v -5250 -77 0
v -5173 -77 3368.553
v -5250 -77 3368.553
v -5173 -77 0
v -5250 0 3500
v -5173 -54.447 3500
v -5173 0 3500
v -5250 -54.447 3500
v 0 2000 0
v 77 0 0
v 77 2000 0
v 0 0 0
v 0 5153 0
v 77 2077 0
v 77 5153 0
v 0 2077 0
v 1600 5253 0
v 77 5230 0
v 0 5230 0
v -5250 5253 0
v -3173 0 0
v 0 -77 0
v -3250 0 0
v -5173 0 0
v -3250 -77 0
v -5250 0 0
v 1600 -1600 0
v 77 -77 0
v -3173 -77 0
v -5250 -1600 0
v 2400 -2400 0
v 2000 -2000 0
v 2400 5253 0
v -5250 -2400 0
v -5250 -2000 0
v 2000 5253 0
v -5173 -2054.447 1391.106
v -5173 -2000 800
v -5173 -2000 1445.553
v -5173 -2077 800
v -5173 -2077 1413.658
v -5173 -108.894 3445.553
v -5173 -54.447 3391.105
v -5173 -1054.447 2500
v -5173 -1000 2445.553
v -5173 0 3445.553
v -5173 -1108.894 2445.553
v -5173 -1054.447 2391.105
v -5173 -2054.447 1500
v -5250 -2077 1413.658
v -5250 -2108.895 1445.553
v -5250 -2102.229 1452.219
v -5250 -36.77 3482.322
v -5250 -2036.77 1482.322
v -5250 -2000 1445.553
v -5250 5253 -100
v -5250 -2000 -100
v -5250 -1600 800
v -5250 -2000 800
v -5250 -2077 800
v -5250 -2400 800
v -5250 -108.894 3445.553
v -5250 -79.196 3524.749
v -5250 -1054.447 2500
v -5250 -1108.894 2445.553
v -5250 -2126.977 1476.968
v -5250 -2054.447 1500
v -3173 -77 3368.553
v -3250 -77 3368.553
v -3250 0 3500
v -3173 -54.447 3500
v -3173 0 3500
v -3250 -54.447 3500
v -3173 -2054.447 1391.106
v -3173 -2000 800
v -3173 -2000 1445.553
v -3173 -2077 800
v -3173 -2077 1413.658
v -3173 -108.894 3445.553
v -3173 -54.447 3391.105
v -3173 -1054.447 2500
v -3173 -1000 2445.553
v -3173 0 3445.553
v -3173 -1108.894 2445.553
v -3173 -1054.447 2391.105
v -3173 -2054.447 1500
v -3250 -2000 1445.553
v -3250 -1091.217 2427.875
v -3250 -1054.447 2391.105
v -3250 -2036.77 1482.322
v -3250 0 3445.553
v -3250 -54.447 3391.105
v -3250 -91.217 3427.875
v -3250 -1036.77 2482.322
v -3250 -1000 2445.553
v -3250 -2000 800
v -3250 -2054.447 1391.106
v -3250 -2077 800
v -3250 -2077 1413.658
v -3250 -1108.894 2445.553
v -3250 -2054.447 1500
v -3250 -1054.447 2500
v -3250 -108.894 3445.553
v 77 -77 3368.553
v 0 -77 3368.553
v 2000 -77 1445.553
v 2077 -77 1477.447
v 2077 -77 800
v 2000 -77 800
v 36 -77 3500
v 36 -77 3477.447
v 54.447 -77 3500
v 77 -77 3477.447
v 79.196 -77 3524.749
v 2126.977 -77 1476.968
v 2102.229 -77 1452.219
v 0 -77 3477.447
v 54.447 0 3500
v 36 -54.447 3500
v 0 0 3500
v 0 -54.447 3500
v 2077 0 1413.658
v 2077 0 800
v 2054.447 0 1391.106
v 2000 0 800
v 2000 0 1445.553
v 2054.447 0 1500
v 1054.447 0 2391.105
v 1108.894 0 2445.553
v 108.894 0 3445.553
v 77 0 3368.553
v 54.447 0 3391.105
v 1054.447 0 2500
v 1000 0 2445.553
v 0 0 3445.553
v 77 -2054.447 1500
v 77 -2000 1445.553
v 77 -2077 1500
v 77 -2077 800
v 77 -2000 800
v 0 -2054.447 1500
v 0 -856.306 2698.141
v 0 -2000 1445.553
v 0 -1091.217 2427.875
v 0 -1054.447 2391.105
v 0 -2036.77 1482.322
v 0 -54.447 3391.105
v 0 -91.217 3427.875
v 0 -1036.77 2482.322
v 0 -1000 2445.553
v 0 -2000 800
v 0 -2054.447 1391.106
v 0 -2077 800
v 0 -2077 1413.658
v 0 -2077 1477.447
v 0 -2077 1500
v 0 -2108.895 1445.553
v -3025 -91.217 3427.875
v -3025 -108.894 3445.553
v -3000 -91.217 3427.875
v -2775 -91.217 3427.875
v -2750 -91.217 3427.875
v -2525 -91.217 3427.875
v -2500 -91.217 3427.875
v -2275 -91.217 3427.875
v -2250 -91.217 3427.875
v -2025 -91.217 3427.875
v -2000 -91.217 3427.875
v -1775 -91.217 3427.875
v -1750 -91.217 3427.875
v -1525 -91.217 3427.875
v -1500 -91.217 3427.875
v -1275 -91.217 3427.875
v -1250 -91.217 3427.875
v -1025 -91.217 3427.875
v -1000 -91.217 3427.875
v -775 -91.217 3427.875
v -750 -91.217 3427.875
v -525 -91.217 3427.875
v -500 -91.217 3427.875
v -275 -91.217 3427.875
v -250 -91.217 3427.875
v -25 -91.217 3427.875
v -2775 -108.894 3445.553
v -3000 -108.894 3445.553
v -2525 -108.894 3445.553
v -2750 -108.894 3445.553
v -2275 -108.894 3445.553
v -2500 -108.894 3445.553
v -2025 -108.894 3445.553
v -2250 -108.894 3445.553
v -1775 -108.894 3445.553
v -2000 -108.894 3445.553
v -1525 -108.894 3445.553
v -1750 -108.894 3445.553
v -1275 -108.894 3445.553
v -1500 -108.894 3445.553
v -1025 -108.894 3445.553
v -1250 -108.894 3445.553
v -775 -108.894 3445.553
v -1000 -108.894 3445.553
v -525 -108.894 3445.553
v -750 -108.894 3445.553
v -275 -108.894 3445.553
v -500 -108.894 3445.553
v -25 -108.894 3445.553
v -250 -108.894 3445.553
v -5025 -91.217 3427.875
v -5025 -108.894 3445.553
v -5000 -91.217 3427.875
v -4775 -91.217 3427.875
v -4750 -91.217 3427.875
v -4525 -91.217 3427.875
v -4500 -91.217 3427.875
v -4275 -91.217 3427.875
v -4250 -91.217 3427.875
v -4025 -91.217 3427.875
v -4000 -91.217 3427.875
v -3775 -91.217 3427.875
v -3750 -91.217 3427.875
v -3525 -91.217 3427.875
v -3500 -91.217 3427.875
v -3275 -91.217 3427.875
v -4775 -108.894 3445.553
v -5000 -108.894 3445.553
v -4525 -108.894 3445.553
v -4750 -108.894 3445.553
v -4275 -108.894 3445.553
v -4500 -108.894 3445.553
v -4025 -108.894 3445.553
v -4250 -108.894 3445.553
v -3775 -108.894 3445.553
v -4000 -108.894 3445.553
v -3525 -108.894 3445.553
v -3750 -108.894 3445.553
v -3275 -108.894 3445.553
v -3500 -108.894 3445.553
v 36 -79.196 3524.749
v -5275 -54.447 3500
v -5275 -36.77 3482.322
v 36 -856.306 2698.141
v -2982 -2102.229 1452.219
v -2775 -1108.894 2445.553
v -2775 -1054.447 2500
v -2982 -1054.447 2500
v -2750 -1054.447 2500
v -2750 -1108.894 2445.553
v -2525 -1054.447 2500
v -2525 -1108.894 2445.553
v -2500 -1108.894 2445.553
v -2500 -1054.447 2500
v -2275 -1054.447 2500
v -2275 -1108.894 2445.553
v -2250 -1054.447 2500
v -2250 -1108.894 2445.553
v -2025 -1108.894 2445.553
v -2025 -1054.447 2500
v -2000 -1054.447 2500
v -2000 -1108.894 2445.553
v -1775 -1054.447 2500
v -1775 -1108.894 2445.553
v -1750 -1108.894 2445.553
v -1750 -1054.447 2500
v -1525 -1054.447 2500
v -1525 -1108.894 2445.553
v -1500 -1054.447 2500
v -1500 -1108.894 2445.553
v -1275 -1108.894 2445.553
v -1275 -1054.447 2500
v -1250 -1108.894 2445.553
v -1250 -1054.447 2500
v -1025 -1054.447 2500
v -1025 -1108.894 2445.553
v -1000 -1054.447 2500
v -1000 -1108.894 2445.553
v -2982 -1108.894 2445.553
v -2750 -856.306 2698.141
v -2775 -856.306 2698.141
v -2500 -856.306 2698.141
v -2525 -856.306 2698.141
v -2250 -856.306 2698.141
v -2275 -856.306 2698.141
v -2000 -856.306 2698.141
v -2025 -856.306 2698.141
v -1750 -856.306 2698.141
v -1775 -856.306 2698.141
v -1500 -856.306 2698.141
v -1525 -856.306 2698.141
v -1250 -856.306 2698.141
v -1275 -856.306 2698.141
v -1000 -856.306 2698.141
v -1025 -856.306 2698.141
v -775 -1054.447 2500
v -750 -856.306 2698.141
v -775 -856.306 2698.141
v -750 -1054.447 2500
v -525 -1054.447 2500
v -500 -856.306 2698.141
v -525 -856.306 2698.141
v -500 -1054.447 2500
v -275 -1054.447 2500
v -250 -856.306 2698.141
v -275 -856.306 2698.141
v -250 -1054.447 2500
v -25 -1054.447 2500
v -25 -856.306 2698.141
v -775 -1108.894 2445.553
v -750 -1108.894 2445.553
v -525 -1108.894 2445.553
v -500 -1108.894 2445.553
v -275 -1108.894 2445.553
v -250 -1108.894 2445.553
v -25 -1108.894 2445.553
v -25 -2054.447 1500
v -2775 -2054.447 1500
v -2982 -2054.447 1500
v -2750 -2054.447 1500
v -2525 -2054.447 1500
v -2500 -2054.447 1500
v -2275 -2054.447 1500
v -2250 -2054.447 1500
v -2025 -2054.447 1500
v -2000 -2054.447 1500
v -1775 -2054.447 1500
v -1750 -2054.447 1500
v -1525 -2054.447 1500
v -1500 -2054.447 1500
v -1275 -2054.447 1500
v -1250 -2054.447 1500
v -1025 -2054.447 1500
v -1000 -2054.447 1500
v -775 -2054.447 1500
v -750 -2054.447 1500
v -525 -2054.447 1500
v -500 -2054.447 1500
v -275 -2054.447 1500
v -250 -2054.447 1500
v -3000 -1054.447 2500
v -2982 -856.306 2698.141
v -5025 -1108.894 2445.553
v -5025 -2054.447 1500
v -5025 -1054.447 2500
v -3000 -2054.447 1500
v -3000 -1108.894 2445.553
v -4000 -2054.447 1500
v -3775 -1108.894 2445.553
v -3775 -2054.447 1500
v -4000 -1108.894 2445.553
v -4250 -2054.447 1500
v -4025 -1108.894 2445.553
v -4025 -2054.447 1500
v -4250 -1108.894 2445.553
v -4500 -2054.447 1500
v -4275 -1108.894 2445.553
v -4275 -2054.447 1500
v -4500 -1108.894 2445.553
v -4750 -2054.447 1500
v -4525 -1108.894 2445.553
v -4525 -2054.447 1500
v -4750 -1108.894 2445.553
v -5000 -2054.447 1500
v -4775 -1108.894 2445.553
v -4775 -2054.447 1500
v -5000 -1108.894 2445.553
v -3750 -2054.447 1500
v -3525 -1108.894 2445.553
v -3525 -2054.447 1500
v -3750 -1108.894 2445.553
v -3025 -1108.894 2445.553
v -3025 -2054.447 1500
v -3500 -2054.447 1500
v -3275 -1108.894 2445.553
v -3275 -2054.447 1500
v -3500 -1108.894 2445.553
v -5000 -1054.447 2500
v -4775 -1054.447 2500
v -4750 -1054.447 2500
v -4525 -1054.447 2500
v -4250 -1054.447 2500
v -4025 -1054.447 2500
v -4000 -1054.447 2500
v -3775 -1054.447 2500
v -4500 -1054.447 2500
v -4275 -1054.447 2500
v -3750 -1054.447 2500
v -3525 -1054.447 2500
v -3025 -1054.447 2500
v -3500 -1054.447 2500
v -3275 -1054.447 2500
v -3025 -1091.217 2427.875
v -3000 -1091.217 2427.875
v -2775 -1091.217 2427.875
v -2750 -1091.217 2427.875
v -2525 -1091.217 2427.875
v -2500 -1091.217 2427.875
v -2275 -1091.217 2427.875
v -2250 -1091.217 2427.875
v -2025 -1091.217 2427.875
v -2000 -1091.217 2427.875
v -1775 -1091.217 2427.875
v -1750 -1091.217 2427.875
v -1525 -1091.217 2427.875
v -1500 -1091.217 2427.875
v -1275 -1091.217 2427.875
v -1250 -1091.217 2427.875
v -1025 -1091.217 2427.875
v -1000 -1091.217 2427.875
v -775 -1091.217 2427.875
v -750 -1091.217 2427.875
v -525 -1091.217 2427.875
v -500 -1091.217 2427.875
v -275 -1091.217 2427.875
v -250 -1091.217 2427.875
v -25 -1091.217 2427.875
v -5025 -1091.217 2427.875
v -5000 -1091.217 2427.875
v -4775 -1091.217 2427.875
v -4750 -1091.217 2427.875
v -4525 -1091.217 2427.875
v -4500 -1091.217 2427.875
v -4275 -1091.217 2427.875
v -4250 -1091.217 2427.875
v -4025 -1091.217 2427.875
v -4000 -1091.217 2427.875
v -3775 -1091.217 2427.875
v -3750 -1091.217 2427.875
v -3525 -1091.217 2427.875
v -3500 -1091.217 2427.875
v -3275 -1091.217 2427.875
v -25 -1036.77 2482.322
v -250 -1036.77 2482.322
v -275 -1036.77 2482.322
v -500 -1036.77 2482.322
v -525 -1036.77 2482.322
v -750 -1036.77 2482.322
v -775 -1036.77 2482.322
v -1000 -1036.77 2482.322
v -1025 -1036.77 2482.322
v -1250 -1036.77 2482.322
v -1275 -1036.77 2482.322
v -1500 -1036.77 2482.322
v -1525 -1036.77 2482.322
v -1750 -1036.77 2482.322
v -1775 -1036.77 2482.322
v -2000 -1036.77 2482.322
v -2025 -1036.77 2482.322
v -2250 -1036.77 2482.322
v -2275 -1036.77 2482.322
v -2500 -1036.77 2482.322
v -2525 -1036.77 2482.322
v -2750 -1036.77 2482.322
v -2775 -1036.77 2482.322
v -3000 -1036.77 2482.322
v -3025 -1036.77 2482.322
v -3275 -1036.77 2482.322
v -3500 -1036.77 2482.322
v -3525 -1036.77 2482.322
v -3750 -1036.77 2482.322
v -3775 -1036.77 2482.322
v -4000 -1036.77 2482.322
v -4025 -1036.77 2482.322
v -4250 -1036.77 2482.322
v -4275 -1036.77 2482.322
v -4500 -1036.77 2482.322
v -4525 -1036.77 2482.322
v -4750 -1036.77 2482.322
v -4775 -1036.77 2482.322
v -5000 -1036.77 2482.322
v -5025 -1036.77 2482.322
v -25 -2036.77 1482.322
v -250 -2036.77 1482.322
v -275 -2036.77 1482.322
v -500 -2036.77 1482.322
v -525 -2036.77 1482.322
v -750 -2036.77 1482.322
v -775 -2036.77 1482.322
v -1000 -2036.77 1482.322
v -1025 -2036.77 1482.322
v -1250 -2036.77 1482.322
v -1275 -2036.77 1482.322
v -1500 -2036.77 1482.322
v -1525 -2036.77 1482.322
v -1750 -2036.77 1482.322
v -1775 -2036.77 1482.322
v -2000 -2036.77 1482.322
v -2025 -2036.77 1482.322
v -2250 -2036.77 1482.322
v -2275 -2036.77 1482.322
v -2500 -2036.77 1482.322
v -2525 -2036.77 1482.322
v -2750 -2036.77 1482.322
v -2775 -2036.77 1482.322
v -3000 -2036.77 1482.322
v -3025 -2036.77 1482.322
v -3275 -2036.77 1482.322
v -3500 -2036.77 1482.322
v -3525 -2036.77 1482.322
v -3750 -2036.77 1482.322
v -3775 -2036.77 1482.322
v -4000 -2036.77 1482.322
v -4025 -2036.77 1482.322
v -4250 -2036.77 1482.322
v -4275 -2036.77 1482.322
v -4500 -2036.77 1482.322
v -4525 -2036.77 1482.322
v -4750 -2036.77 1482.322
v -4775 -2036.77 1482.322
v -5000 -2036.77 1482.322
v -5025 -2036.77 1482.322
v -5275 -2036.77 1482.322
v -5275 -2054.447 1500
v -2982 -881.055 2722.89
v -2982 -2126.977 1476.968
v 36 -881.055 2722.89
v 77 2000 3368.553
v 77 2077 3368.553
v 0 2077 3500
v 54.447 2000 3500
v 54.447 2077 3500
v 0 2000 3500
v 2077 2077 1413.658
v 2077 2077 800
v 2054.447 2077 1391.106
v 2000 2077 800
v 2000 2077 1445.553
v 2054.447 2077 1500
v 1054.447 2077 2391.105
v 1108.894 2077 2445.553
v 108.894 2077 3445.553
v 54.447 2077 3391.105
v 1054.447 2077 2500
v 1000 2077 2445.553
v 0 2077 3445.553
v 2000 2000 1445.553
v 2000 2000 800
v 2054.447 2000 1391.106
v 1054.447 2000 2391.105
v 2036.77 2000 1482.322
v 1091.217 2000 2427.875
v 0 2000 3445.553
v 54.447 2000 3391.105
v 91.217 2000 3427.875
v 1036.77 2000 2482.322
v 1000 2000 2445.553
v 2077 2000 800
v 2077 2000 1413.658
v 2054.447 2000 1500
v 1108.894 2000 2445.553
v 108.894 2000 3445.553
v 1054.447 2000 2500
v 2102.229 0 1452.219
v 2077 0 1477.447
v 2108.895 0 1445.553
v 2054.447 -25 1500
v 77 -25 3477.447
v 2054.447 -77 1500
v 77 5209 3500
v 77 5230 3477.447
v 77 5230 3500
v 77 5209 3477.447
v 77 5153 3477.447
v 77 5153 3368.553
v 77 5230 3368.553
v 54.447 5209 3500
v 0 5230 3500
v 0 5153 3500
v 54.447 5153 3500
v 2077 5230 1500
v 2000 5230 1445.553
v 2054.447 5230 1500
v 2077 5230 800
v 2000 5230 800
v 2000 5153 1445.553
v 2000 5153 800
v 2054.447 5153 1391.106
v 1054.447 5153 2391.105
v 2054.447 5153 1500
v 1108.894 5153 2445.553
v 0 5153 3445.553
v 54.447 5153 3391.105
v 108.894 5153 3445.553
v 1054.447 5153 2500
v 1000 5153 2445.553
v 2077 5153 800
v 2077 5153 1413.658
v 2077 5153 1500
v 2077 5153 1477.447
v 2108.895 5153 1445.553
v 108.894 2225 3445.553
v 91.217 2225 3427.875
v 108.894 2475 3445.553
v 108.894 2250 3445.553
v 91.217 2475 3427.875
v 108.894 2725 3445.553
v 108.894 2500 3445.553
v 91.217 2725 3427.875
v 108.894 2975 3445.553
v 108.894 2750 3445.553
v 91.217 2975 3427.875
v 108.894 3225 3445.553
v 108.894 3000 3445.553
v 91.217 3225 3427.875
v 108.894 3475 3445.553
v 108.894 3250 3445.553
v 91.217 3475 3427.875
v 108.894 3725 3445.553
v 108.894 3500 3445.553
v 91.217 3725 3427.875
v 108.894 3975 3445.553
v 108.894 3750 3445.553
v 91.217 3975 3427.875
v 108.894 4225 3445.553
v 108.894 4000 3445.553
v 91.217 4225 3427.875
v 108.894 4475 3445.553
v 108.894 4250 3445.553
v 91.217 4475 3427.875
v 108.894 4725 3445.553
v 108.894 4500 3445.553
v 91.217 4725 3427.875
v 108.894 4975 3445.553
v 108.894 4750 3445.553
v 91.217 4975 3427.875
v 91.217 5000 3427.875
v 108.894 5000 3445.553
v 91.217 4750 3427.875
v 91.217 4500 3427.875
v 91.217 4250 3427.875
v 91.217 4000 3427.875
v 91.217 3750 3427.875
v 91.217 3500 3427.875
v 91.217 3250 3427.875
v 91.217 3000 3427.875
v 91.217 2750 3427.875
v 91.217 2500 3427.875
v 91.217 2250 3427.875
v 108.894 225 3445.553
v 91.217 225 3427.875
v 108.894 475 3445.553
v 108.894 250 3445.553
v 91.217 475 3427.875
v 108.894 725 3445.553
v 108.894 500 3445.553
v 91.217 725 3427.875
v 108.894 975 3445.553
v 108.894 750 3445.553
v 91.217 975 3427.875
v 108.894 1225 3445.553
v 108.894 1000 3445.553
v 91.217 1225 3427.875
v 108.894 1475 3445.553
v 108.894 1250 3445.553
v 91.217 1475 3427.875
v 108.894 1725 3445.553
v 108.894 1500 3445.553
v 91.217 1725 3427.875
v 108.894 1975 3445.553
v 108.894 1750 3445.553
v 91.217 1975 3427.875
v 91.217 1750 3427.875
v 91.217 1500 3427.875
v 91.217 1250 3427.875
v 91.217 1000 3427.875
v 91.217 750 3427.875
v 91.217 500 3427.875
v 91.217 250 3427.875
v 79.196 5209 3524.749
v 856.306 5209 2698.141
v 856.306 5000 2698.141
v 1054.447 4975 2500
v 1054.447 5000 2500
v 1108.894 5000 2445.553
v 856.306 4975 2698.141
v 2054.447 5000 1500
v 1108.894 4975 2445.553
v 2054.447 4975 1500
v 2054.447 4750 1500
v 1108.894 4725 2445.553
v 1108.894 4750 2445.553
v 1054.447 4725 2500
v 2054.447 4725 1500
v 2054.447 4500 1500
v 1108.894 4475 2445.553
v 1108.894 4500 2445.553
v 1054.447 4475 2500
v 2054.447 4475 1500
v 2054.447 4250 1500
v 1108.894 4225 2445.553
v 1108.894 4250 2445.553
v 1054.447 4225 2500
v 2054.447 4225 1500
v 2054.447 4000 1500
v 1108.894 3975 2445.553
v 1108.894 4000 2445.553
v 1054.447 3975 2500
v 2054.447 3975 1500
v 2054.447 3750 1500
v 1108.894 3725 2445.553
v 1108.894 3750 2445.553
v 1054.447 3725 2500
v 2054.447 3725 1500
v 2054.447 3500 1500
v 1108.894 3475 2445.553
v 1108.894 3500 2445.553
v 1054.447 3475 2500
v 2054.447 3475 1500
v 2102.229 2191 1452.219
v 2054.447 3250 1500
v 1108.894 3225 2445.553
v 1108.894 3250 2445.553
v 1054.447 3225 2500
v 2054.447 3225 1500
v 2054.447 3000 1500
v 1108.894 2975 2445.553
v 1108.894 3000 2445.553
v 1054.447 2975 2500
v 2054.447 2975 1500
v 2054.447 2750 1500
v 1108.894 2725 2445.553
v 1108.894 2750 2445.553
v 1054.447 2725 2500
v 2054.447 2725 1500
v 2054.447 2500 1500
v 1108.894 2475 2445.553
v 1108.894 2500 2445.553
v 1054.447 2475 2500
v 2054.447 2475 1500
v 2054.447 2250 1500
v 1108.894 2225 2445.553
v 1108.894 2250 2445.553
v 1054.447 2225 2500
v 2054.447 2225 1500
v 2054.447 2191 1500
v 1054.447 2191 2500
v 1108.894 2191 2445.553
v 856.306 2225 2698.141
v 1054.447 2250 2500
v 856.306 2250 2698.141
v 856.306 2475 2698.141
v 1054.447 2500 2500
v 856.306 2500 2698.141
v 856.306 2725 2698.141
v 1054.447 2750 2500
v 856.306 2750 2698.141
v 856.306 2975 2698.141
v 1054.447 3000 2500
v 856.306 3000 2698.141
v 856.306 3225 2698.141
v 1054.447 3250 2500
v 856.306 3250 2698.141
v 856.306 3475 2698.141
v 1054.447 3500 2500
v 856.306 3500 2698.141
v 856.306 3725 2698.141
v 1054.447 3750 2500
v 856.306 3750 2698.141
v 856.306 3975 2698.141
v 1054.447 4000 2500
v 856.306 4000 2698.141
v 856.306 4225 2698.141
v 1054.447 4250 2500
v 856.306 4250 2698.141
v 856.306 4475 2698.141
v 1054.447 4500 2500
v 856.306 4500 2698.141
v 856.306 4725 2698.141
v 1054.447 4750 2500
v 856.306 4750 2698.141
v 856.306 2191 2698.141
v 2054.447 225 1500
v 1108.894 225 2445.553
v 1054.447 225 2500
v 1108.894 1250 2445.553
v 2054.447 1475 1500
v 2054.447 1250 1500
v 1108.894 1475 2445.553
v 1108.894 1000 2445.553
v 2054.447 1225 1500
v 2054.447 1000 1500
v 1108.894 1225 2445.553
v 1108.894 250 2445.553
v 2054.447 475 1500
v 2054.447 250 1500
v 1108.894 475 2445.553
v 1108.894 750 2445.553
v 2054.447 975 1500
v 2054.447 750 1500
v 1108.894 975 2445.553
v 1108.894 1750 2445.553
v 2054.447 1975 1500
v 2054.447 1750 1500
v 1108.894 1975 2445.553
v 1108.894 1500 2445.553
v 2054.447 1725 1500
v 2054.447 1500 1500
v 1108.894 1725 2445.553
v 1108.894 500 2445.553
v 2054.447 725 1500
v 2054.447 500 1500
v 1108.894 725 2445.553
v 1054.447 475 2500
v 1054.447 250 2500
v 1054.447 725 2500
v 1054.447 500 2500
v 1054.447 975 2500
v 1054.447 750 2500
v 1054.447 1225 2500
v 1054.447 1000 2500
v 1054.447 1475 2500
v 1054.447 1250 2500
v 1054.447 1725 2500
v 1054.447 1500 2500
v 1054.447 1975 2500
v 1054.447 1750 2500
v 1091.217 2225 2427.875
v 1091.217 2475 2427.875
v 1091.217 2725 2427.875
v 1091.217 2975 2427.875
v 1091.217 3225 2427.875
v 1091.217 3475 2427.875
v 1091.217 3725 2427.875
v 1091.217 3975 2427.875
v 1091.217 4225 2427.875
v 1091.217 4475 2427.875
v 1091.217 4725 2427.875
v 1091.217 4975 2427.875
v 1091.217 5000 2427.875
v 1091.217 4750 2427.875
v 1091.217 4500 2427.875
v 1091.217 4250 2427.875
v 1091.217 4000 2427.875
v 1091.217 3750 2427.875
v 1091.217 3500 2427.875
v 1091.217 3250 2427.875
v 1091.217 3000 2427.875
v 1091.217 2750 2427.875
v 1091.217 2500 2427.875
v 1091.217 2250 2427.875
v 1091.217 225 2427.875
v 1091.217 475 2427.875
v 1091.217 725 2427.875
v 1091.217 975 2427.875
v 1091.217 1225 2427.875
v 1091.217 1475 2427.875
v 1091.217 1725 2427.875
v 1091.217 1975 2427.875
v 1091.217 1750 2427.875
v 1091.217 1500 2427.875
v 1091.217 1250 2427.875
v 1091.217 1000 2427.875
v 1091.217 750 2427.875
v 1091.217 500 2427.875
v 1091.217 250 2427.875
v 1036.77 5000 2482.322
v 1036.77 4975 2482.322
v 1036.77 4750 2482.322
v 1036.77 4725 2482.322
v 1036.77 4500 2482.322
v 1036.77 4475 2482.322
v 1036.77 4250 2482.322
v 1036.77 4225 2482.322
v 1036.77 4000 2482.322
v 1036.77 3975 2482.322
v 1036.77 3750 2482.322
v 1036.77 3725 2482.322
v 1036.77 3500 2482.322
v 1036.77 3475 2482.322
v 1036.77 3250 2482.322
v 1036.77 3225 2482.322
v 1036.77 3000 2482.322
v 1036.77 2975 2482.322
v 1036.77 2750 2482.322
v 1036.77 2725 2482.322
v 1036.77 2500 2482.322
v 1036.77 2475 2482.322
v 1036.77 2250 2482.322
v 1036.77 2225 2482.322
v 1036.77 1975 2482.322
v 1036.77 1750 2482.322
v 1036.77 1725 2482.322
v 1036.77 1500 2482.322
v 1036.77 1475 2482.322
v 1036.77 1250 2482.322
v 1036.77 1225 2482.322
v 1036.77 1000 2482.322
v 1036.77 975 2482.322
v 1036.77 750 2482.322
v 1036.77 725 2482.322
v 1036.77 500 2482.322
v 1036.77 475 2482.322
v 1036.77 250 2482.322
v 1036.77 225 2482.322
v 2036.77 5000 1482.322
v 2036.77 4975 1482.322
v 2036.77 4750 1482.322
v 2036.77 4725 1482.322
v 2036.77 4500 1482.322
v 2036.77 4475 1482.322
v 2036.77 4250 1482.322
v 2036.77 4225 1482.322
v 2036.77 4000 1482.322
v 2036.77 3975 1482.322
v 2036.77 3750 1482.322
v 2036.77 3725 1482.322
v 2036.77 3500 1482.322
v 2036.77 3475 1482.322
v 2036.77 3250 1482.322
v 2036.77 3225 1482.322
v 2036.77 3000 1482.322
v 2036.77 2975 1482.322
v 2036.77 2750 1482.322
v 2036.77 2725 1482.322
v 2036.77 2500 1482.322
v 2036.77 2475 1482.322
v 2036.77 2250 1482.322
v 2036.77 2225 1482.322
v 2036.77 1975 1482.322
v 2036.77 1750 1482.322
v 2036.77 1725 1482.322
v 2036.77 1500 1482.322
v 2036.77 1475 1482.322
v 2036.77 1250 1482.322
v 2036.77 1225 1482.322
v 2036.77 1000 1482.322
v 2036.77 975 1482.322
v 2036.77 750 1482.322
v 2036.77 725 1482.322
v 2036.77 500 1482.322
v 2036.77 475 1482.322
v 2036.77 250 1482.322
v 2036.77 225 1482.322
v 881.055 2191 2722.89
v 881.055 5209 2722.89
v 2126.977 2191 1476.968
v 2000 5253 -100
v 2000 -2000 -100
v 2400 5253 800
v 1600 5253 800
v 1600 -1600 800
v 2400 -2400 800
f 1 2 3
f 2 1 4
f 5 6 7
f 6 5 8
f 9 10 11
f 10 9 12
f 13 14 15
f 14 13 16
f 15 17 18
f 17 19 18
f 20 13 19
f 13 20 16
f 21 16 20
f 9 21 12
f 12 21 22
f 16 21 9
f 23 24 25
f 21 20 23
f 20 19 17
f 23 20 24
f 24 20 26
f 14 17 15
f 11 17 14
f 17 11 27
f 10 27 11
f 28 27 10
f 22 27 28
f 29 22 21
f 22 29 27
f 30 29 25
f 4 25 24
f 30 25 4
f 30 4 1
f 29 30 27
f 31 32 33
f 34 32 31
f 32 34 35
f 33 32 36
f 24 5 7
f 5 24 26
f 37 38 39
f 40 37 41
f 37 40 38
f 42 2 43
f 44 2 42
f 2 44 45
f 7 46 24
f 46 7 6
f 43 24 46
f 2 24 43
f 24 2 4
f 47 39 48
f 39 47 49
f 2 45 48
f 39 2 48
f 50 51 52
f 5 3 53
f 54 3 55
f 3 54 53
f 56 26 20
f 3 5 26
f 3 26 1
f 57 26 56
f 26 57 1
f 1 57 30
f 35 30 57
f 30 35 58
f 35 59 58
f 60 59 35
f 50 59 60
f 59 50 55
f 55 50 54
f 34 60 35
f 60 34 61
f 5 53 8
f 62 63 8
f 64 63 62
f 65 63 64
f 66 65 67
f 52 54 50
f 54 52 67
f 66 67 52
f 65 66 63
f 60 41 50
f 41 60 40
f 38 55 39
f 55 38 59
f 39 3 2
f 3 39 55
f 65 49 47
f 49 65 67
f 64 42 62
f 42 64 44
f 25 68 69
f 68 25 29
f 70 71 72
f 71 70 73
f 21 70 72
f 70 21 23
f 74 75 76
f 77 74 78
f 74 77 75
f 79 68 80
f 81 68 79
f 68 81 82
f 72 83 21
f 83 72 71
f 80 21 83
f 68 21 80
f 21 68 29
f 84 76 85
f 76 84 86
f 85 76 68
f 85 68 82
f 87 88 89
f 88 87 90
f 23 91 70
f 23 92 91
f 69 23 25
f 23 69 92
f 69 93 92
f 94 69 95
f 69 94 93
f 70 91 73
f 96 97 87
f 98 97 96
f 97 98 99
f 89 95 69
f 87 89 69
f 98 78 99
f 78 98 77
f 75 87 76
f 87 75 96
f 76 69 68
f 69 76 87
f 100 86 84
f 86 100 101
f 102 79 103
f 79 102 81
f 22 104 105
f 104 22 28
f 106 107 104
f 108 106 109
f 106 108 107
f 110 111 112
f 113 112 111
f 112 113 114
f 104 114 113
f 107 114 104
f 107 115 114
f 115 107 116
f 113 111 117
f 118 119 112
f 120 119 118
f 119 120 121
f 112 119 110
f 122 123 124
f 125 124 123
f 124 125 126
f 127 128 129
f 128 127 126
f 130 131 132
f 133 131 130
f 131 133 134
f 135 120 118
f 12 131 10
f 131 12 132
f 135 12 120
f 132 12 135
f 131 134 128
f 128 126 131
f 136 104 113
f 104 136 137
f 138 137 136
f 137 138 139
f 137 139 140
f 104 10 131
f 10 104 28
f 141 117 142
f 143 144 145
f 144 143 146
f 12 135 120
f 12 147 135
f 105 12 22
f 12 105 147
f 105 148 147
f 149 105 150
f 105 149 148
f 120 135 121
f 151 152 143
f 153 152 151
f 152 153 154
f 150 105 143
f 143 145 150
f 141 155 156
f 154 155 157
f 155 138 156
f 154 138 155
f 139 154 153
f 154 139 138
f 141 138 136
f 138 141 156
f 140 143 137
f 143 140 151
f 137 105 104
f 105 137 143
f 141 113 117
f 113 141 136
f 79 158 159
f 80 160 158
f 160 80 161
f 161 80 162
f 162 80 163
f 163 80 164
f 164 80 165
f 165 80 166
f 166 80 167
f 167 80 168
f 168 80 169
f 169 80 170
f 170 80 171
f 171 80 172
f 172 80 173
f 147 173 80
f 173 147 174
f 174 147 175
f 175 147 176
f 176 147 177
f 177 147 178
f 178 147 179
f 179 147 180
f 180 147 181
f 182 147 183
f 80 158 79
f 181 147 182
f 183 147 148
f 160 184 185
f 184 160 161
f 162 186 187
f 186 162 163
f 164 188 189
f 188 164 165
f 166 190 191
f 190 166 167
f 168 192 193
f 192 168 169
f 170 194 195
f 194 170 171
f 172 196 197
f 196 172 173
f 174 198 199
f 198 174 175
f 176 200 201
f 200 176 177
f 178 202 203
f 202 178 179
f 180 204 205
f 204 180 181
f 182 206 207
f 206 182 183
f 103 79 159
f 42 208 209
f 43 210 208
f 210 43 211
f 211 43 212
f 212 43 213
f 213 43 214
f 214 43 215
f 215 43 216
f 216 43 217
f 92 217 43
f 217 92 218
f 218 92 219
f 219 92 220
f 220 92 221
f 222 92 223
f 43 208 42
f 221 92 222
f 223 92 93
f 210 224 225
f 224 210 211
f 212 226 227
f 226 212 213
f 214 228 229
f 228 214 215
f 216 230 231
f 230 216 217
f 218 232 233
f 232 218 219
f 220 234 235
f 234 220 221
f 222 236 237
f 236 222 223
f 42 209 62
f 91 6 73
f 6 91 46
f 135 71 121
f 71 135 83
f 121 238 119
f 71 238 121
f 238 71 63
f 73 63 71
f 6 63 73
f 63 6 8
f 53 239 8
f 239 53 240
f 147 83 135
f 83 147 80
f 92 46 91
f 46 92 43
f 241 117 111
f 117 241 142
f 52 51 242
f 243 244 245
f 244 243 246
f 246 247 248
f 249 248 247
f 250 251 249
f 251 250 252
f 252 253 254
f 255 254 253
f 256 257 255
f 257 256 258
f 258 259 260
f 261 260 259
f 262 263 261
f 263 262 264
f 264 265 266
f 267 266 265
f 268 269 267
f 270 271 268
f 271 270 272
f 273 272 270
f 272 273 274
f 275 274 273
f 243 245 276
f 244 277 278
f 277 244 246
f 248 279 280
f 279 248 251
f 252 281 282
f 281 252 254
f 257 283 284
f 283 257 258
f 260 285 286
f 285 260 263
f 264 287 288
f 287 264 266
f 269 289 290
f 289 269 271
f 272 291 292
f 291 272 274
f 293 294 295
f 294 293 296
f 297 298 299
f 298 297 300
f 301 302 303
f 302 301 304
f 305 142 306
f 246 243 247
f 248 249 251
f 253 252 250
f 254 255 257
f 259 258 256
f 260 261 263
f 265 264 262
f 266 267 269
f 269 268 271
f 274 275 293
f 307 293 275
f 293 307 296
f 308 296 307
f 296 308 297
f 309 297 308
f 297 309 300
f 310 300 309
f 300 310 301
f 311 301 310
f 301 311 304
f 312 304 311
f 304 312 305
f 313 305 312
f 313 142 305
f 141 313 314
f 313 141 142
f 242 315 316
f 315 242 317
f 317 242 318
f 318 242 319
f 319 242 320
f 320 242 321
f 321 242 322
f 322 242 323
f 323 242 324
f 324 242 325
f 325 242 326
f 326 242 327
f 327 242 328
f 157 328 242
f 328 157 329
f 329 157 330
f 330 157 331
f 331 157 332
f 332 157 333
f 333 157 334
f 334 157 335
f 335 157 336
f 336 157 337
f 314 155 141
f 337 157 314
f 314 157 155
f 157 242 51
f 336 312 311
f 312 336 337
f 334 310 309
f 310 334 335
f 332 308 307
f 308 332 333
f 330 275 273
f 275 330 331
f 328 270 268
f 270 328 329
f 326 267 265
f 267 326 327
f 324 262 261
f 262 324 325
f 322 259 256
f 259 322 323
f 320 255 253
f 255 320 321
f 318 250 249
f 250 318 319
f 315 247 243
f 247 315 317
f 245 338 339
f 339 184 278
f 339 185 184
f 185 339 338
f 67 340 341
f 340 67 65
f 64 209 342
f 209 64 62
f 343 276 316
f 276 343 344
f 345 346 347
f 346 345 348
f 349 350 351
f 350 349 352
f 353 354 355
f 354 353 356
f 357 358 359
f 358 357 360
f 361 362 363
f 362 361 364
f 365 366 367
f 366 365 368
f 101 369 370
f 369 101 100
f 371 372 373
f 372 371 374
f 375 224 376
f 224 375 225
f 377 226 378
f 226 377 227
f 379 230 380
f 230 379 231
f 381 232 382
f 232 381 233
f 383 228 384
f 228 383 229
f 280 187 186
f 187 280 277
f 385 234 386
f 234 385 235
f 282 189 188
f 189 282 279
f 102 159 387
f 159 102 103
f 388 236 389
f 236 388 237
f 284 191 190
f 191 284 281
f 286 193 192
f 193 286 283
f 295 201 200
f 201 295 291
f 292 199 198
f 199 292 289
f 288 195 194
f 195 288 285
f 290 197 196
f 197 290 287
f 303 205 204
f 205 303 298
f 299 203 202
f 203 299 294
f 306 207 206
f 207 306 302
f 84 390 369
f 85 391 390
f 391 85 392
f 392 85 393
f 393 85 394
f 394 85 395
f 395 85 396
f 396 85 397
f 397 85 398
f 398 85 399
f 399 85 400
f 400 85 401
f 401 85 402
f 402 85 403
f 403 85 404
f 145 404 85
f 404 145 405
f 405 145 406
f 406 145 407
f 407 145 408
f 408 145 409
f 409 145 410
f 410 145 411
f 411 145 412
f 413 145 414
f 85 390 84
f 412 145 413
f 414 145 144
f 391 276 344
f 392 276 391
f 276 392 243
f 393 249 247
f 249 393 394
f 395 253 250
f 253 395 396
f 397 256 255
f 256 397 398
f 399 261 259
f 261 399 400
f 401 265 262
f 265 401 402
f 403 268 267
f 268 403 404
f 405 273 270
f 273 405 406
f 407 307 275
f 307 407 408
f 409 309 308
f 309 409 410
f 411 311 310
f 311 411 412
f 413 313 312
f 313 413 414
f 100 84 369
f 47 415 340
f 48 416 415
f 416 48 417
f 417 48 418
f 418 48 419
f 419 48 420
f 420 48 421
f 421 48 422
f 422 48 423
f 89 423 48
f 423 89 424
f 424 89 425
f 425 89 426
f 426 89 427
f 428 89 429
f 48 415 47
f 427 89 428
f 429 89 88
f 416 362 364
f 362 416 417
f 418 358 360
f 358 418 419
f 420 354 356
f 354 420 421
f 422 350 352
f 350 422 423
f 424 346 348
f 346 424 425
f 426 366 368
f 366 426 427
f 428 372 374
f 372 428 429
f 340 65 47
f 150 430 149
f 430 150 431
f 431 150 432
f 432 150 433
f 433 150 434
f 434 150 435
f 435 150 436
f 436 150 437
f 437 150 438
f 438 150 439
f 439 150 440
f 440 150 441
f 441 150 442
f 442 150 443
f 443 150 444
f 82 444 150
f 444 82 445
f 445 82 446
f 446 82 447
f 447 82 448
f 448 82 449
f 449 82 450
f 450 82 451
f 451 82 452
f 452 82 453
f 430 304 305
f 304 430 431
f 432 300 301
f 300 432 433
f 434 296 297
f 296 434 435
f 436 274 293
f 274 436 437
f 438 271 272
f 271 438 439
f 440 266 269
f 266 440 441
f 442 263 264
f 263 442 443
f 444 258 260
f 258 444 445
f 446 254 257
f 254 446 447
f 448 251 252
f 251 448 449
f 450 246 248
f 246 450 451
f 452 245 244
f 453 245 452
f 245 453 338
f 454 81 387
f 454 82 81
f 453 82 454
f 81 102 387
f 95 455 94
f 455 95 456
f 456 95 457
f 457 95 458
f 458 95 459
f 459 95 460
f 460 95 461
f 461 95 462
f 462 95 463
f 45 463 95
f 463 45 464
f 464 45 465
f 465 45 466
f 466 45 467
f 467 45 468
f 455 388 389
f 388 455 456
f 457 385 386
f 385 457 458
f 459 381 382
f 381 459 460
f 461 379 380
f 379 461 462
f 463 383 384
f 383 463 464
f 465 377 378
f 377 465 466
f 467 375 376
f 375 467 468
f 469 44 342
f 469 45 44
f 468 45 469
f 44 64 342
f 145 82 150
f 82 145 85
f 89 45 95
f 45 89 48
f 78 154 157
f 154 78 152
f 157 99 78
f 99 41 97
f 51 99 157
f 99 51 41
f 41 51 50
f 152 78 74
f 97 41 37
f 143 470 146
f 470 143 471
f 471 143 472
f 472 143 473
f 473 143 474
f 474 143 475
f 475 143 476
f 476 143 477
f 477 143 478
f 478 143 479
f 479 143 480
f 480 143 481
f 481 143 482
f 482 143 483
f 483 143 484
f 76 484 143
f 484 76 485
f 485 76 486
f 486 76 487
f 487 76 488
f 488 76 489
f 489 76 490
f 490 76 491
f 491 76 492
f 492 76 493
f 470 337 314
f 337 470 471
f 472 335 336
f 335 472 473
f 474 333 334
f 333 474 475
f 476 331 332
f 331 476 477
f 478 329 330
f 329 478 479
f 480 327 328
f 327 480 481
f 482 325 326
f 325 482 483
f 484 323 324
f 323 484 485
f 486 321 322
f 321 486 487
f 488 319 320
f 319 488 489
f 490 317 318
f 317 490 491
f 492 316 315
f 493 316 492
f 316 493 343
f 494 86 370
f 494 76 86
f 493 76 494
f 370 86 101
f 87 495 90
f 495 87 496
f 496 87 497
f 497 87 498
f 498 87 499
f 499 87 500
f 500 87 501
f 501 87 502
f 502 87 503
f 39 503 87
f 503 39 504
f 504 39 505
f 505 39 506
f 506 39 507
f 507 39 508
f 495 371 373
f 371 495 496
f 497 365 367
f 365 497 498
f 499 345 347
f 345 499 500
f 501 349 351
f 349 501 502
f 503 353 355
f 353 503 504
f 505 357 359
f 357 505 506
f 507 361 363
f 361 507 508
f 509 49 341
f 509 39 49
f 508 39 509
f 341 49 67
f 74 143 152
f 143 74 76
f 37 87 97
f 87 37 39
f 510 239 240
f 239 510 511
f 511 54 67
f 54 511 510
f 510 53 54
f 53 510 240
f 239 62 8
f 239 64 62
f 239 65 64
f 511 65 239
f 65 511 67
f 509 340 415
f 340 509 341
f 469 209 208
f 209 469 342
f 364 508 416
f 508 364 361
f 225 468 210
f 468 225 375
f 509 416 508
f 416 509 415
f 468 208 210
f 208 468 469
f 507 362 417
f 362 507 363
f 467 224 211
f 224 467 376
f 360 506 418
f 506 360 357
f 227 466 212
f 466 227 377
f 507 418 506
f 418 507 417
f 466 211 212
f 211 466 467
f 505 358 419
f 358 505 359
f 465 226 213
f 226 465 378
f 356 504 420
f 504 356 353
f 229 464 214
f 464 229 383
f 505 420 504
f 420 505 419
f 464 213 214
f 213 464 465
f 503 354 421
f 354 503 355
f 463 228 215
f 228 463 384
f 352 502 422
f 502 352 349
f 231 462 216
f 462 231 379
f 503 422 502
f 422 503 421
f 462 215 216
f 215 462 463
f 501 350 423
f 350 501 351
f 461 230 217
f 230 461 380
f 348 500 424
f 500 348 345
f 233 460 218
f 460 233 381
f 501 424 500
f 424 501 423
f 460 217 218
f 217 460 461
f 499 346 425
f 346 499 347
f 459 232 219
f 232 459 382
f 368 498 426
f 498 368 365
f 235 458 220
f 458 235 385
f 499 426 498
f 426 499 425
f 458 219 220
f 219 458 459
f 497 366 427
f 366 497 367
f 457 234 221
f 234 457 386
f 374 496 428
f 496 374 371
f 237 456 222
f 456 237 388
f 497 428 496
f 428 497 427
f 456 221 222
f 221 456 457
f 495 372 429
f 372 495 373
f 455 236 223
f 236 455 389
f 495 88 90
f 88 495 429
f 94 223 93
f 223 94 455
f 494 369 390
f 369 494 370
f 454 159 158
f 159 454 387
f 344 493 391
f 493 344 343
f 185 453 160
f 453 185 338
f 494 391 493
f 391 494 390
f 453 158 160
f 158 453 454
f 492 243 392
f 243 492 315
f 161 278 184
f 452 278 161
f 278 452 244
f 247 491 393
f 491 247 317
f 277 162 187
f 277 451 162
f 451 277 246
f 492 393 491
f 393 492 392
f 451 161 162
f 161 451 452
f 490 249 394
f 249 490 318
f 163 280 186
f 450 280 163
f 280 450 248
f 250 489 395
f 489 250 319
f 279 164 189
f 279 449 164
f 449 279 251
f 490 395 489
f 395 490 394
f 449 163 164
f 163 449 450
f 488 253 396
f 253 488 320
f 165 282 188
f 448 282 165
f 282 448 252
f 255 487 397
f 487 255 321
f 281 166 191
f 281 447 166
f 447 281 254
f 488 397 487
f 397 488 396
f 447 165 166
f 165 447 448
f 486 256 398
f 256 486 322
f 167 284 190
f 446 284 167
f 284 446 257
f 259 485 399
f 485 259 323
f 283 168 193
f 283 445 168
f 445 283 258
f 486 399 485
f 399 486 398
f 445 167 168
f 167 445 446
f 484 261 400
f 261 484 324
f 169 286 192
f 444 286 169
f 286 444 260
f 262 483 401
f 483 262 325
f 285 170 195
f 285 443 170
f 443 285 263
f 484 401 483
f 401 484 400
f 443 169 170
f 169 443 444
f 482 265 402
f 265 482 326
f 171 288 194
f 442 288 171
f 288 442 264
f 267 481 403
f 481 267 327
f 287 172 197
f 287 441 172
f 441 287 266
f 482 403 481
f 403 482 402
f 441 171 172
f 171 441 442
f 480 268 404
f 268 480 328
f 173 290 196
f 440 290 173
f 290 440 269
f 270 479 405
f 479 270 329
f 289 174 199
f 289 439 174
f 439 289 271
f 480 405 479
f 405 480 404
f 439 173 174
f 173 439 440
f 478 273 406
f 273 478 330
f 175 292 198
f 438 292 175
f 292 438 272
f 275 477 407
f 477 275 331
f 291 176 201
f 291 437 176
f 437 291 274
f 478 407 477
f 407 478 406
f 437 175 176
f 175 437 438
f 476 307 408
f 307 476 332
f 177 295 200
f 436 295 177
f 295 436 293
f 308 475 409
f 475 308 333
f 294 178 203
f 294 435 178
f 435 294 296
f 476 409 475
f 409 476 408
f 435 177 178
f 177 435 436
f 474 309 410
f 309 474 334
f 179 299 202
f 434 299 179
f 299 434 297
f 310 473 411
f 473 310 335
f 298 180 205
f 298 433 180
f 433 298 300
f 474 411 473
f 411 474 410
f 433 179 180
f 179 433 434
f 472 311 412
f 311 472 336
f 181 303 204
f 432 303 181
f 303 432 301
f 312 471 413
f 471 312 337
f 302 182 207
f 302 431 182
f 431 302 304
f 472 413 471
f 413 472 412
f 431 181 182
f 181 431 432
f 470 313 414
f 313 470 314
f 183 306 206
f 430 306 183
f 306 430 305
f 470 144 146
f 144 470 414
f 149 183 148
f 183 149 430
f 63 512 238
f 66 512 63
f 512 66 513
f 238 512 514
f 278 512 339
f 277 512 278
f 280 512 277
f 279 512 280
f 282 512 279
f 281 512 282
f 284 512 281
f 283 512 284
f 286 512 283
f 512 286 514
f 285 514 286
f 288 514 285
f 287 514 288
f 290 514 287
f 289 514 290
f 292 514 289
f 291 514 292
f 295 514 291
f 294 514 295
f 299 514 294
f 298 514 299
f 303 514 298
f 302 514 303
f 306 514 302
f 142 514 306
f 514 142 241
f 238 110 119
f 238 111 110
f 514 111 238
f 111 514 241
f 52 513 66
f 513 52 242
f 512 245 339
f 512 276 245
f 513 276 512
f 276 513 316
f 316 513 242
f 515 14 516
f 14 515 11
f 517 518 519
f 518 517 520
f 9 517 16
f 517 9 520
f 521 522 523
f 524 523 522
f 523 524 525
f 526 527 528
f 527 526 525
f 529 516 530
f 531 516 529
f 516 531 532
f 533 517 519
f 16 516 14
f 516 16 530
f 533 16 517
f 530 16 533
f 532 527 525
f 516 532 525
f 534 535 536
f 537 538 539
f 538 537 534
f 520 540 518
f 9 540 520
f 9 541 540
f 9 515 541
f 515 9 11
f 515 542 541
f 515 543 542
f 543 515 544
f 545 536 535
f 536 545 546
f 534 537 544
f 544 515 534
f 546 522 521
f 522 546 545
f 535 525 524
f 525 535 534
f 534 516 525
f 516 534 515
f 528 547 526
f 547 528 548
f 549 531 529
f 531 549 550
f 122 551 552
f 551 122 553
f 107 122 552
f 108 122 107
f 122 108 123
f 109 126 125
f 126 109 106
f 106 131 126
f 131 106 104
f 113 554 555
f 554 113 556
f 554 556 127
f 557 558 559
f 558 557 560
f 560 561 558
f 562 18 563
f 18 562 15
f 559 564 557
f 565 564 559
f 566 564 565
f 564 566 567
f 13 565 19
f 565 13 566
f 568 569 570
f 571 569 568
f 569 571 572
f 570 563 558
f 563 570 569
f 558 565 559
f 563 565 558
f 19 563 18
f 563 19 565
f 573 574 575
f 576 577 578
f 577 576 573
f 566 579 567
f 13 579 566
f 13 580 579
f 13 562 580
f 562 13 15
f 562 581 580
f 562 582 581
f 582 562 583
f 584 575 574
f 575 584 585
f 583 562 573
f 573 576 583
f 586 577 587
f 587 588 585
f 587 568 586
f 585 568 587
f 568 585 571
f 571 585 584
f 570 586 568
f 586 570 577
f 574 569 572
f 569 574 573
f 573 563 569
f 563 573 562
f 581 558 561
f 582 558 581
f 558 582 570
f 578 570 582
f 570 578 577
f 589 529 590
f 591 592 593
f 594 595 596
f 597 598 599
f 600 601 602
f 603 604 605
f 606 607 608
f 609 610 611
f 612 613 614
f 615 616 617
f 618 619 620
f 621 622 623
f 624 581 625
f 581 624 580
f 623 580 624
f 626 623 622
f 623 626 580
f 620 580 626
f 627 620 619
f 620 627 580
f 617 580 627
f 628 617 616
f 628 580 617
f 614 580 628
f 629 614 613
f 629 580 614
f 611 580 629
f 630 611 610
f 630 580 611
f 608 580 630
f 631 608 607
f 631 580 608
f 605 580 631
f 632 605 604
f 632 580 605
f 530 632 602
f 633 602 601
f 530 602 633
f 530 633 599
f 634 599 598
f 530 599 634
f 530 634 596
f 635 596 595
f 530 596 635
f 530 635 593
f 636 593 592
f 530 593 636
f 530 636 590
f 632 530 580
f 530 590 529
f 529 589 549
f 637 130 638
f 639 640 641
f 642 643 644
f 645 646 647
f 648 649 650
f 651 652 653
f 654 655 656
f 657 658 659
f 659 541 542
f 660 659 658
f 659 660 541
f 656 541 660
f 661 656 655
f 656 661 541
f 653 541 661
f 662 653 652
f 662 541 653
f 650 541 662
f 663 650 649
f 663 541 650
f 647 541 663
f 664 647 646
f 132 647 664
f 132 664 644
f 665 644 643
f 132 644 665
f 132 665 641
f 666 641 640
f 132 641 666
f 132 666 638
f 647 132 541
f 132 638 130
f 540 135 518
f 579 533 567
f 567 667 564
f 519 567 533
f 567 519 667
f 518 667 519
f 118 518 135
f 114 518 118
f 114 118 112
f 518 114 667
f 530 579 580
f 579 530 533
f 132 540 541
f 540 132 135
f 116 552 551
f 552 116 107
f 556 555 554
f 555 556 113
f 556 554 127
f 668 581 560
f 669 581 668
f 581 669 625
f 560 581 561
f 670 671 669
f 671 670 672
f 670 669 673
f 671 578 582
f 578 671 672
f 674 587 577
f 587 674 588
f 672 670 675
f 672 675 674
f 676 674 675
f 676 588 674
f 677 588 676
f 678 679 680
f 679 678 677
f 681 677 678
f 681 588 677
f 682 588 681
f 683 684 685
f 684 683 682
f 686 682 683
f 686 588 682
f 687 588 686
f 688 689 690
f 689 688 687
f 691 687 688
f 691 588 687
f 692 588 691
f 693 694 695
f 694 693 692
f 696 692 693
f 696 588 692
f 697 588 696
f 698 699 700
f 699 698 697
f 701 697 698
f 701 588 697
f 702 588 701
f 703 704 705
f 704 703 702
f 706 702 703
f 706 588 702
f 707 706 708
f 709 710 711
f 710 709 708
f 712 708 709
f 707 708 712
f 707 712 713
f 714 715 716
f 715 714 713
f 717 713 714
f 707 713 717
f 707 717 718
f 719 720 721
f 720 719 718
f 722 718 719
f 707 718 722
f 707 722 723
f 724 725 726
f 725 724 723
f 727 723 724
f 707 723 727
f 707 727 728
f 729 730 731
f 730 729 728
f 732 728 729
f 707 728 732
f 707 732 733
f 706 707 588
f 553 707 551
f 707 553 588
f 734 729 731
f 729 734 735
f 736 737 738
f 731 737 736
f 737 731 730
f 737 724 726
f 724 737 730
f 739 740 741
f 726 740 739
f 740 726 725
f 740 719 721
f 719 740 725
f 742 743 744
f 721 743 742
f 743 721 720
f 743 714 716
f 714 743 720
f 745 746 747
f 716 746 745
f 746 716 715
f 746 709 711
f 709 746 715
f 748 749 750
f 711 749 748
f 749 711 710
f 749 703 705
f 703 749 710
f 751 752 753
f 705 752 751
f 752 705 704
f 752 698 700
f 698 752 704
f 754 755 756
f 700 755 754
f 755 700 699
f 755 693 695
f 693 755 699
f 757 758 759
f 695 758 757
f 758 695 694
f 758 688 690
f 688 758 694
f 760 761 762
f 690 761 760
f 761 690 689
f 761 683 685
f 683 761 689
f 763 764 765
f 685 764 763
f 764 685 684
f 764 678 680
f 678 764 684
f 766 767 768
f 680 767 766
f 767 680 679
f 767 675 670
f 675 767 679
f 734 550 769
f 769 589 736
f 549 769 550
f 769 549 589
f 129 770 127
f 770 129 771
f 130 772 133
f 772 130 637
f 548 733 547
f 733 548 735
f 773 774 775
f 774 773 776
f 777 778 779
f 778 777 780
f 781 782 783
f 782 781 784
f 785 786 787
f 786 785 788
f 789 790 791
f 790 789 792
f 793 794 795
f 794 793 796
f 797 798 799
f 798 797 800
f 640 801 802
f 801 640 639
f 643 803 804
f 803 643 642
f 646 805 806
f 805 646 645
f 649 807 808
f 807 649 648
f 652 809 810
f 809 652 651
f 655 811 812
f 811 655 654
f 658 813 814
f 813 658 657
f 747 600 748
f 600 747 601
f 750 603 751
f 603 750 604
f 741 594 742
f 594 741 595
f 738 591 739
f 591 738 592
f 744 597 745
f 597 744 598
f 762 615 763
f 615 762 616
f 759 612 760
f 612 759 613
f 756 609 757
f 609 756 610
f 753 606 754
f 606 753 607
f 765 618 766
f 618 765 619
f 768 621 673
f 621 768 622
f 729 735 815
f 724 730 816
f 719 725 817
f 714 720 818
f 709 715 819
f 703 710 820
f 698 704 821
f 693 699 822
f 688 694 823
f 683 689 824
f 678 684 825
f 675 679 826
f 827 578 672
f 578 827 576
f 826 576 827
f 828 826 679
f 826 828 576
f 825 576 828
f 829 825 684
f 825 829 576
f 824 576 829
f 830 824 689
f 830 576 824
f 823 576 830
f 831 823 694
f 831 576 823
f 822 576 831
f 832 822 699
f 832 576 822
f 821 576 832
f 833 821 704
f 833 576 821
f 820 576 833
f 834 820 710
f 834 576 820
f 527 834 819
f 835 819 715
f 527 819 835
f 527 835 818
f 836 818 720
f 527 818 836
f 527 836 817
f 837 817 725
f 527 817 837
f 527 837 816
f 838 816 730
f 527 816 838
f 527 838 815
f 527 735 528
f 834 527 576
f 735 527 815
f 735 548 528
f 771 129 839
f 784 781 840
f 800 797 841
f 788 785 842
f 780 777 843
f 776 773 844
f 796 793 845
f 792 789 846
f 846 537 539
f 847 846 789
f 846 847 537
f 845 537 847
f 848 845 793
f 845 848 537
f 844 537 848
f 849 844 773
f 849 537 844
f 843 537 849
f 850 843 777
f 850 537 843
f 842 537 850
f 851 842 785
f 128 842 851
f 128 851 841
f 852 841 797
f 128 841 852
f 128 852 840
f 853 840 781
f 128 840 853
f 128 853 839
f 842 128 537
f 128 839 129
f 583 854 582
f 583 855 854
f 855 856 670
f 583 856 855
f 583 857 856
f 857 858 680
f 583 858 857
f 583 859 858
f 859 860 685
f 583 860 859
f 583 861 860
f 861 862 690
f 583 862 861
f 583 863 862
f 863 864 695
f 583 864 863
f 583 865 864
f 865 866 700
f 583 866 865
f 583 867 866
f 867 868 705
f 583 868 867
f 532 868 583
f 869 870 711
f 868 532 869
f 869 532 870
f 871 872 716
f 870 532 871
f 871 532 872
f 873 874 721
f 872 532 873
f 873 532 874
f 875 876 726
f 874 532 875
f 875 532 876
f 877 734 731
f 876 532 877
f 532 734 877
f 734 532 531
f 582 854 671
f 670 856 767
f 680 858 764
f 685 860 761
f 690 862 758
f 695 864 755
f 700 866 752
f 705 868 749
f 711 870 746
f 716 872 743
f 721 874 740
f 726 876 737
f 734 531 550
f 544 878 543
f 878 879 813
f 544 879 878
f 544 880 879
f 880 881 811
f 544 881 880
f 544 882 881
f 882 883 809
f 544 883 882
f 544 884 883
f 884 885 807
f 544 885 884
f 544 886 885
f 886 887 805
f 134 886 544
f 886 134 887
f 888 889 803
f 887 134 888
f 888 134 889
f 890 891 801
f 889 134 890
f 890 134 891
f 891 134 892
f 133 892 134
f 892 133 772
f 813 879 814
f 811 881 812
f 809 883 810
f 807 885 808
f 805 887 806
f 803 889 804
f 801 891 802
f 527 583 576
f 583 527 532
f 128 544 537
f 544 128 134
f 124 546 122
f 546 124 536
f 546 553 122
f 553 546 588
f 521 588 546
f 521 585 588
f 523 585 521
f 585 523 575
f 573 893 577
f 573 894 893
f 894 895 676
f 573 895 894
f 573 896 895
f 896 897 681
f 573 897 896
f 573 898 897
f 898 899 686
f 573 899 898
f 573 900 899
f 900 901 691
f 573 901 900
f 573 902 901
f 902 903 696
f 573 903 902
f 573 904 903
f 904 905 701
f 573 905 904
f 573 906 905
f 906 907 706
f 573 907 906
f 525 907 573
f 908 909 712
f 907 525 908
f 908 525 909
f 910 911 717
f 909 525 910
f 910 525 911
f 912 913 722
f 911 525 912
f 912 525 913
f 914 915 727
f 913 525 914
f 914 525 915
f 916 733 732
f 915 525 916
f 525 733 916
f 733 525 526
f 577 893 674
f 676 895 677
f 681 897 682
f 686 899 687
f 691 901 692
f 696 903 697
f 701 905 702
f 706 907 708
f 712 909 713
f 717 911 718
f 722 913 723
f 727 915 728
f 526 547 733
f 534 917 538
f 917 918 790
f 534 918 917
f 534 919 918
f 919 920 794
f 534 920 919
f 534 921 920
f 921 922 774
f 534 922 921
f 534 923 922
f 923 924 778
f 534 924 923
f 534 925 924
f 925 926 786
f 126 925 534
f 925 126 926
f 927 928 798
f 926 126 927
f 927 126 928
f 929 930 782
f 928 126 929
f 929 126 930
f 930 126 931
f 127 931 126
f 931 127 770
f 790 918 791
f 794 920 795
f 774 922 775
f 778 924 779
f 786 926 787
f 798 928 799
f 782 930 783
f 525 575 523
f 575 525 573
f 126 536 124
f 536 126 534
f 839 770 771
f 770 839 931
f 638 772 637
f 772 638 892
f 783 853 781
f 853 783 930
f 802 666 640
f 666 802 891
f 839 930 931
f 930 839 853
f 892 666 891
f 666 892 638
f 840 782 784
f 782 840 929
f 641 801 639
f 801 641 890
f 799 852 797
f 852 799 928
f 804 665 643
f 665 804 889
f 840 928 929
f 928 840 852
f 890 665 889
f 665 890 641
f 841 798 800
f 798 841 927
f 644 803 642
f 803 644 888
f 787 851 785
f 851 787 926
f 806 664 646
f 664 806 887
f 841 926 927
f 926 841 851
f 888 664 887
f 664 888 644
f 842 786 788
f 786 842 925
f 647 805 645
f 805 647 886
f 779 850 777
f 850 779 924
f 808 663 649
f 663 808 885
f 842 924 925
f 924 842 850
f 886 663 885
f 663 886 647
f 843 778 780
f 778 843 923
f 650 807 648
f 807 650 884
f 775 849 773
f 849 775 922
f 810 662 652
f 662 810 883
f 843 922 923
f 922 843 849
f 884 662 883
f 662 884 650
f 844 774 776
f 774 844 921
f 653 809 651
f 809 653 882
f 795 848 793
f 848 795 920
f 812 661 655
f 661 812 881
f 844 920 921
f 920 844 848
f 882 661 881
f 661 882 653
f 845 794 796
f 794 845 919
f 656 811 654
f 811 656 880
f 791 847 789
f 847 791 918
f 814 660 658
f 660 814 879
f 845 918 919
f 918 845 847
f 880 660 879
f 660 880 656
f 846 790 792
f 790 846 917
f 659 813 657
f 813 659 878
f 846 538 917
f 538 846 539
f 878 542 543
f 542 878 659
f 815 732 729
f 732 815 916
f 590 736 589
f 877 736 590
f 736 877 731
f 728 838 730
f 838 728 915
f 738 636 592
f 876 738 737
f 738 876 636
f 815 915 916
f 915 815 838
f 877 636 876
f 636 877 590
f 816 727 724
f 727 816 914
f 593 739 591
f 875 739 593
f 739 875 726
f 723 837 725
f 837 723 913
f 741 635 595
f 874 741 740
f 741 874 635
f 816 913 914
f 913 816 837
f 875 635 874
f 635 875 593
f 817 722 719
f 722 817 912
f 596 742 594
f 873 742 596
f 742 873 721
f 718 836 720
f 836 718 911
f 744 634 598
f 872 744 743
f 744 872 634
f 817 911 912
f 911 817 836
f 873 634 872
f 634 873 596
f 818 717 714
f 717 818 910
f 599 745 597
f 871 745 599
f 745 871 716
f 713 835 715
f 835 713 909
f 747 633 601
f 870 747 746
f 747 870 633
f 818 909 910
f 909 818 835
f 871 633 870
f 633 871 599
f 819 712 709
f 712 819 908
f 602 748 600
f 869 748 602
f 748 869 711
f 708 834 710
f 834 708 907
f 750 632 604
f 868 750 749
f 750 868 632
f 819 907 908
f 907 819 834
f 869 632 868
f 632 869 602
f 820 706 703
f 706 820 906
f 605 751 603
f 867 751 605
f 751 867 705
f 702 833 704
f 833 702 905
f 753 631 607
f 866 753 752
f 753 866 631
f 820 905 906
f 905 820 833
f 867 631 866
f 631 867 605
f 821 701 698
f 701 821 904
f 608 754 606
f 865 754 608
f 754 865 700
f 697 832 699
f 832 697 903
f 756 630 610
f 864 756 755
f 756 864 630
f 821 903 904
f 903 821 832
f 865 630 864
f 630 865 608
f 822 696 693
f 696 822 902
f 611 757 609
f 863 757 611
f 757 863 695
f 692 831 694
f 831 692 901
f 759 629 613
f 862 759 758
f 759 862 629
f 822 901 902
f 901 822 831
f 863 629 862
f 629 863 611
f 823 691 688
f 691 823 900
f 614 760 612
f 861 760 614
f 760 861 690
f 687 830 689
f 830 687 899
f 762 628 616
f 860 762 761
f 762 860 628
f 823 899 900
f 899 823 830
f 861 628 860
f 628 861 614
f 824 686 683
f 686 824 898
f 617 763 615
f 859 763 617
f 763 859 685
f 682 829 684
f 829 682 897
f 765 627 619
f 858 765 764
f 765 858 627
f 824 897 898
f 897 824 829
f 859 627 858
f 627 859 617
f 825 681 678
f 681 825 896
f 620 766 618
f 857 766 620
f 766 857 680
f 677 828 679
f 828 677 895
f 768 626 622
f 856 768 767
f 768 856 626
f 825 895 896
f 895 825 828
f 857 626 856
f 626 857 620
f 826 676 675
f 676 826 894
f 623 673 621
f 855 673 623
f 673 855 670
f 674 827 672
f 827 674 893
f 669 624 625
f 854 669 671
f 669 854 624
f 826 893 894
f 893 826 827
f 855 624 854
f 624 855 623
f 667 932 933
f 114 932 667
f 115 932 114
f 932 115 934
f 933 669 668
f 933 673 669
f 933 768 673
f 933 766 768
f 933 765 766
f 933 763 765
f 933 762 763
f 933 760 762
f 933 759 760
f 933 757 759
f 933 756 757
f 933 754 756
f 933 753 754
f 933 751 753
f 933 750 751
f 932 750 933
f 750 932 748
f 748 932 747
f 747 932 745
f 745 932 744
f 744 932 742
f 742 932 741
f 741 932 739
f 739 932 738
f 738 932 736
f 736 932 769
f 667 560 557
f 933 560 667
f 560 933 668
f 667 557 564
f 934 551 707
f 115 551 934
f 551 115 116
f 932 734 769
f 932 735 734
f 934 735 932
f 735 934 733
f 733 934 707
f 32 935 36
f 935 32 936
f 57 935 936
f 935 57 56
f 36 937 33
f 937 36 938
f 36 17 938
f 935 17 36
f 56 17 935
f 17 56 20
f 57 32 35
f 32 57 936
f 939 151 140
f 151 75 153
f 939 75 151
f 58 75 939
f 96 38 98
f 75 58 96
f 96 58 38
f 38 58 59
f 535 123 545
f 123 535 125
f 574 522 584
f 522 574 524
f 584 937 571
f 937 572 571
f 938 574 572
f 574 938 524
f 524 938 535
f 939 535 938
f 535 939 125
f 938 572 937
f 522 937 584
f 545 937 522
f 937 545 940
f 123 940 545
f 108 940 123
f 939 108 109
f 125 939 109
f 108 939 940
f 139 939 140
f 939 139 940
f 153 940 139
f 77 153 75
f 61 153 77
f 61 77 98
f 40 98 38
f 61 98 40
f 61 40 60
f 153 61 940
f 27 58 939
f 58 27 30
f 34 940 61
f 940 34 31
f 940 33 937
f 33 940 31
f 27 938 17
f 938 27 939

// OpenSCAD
vertical_pillar_cross_section_size = 77;
terrace_width = 2000;
inner_wall_height = 3500;
outer_wall_height = inner_wall_height - terrace_width; // I'm assuming 45°
angle = 45;

slope_length = terrace_width/sin(angle);

crossbeam_cross_section_size = 25;

pv_height = 1134;
pv_length = 1762; // seen from 2278 to 1762
pv_thickness = 35;

module arch() {
    cube([vertical_pillar_cross_section_size, vertical_pillar_cross_section_size, inner_wall_height]);
    translate([terrace_width, 0, 0])
        cube([vertical_pillar_cross_section_size, vertical_pillar_cross_section_size, outer_wall_height]);
    translate([vertical_pillar_cross_section_size * sin(angle), 0, inner_wall_height])
        rotate([0, 90 + angle, 0])
            cube([vertical_pillar_cross_section_size, vertical_pillar_cross_section_size, slope_length]);
}

module pv() {
    color("#000080")
    cube([pv_length, pv_height, pv_thickness]);
}

module row(arch_positions, overall_rotation, overall_translation) {
    rotate(overall_rotation)
    translate(overall_translation)
    {
        for (y = arch_positions) {
            translate([0, y, 0])
                arch();
        }
        
        translate([vertical_pillar_cross_section_size * sin(angle), 0,  inner_wall_height])
        rotate([-90, angle, 0])
        {
            for (i = [0, 0.5, 1]) {
                translate([i*slope_length, 0, 0])
                    cube([vertical_pillar_cross_section_size, vertical_pillar_cross_section_size, max(arch_positions)]);
            }
            rotate([0, 90, 0])
            for (i = [0: -250: -max(arch_positions)]) {
                translate([i, 0, 0])
                cube([crossbeam_cross_section_size, crossbeam_cross_section_size, slope_length]);
            }
            
            rotate([90, 0, 0])
            {
                baseline_displacement = min(arch_positions) + vertical_pillar_cross_section_size;
                for(i = [1:3]) {
                    translate([0, baseline_displacement + i*pv_length - vertical_pillar_cross_section_size, 0])
                    rotate([0, 0, -90])
                    pv();
                }
                for(i = [0:1]) {
                    translate([pv_height, baseline_displacement + i*pv_height - vertical_pillar_cross_section_size, 0])
                    pv();
                }
            }
        }
    }
}


module side() {
    row(arch_positions = [-vertical_pillar_cross_section_size, 2000, 5230-vertical_pillar_cross_section_size], overall_rotation = [0, 0, 0], overall_translation = [0, 0, 0]);
}

module front() {
    row(arch_positions = [0, 2000, 5250], overall_rotation = [0, 0, -90], overall_translation = [0, -5250, 0]);

}

color("#000000")
front();
side();

// Terrace
color("#ffffff")
{
translate([-5250, -2000, -100])
    cube([7250, 7253, 100]);
translate([-5250, -2400, 0])
    cube([7250, 800, 800]);
translate([1600, -2400, 0])
    cube([800, 7253+400, 800]);
}
